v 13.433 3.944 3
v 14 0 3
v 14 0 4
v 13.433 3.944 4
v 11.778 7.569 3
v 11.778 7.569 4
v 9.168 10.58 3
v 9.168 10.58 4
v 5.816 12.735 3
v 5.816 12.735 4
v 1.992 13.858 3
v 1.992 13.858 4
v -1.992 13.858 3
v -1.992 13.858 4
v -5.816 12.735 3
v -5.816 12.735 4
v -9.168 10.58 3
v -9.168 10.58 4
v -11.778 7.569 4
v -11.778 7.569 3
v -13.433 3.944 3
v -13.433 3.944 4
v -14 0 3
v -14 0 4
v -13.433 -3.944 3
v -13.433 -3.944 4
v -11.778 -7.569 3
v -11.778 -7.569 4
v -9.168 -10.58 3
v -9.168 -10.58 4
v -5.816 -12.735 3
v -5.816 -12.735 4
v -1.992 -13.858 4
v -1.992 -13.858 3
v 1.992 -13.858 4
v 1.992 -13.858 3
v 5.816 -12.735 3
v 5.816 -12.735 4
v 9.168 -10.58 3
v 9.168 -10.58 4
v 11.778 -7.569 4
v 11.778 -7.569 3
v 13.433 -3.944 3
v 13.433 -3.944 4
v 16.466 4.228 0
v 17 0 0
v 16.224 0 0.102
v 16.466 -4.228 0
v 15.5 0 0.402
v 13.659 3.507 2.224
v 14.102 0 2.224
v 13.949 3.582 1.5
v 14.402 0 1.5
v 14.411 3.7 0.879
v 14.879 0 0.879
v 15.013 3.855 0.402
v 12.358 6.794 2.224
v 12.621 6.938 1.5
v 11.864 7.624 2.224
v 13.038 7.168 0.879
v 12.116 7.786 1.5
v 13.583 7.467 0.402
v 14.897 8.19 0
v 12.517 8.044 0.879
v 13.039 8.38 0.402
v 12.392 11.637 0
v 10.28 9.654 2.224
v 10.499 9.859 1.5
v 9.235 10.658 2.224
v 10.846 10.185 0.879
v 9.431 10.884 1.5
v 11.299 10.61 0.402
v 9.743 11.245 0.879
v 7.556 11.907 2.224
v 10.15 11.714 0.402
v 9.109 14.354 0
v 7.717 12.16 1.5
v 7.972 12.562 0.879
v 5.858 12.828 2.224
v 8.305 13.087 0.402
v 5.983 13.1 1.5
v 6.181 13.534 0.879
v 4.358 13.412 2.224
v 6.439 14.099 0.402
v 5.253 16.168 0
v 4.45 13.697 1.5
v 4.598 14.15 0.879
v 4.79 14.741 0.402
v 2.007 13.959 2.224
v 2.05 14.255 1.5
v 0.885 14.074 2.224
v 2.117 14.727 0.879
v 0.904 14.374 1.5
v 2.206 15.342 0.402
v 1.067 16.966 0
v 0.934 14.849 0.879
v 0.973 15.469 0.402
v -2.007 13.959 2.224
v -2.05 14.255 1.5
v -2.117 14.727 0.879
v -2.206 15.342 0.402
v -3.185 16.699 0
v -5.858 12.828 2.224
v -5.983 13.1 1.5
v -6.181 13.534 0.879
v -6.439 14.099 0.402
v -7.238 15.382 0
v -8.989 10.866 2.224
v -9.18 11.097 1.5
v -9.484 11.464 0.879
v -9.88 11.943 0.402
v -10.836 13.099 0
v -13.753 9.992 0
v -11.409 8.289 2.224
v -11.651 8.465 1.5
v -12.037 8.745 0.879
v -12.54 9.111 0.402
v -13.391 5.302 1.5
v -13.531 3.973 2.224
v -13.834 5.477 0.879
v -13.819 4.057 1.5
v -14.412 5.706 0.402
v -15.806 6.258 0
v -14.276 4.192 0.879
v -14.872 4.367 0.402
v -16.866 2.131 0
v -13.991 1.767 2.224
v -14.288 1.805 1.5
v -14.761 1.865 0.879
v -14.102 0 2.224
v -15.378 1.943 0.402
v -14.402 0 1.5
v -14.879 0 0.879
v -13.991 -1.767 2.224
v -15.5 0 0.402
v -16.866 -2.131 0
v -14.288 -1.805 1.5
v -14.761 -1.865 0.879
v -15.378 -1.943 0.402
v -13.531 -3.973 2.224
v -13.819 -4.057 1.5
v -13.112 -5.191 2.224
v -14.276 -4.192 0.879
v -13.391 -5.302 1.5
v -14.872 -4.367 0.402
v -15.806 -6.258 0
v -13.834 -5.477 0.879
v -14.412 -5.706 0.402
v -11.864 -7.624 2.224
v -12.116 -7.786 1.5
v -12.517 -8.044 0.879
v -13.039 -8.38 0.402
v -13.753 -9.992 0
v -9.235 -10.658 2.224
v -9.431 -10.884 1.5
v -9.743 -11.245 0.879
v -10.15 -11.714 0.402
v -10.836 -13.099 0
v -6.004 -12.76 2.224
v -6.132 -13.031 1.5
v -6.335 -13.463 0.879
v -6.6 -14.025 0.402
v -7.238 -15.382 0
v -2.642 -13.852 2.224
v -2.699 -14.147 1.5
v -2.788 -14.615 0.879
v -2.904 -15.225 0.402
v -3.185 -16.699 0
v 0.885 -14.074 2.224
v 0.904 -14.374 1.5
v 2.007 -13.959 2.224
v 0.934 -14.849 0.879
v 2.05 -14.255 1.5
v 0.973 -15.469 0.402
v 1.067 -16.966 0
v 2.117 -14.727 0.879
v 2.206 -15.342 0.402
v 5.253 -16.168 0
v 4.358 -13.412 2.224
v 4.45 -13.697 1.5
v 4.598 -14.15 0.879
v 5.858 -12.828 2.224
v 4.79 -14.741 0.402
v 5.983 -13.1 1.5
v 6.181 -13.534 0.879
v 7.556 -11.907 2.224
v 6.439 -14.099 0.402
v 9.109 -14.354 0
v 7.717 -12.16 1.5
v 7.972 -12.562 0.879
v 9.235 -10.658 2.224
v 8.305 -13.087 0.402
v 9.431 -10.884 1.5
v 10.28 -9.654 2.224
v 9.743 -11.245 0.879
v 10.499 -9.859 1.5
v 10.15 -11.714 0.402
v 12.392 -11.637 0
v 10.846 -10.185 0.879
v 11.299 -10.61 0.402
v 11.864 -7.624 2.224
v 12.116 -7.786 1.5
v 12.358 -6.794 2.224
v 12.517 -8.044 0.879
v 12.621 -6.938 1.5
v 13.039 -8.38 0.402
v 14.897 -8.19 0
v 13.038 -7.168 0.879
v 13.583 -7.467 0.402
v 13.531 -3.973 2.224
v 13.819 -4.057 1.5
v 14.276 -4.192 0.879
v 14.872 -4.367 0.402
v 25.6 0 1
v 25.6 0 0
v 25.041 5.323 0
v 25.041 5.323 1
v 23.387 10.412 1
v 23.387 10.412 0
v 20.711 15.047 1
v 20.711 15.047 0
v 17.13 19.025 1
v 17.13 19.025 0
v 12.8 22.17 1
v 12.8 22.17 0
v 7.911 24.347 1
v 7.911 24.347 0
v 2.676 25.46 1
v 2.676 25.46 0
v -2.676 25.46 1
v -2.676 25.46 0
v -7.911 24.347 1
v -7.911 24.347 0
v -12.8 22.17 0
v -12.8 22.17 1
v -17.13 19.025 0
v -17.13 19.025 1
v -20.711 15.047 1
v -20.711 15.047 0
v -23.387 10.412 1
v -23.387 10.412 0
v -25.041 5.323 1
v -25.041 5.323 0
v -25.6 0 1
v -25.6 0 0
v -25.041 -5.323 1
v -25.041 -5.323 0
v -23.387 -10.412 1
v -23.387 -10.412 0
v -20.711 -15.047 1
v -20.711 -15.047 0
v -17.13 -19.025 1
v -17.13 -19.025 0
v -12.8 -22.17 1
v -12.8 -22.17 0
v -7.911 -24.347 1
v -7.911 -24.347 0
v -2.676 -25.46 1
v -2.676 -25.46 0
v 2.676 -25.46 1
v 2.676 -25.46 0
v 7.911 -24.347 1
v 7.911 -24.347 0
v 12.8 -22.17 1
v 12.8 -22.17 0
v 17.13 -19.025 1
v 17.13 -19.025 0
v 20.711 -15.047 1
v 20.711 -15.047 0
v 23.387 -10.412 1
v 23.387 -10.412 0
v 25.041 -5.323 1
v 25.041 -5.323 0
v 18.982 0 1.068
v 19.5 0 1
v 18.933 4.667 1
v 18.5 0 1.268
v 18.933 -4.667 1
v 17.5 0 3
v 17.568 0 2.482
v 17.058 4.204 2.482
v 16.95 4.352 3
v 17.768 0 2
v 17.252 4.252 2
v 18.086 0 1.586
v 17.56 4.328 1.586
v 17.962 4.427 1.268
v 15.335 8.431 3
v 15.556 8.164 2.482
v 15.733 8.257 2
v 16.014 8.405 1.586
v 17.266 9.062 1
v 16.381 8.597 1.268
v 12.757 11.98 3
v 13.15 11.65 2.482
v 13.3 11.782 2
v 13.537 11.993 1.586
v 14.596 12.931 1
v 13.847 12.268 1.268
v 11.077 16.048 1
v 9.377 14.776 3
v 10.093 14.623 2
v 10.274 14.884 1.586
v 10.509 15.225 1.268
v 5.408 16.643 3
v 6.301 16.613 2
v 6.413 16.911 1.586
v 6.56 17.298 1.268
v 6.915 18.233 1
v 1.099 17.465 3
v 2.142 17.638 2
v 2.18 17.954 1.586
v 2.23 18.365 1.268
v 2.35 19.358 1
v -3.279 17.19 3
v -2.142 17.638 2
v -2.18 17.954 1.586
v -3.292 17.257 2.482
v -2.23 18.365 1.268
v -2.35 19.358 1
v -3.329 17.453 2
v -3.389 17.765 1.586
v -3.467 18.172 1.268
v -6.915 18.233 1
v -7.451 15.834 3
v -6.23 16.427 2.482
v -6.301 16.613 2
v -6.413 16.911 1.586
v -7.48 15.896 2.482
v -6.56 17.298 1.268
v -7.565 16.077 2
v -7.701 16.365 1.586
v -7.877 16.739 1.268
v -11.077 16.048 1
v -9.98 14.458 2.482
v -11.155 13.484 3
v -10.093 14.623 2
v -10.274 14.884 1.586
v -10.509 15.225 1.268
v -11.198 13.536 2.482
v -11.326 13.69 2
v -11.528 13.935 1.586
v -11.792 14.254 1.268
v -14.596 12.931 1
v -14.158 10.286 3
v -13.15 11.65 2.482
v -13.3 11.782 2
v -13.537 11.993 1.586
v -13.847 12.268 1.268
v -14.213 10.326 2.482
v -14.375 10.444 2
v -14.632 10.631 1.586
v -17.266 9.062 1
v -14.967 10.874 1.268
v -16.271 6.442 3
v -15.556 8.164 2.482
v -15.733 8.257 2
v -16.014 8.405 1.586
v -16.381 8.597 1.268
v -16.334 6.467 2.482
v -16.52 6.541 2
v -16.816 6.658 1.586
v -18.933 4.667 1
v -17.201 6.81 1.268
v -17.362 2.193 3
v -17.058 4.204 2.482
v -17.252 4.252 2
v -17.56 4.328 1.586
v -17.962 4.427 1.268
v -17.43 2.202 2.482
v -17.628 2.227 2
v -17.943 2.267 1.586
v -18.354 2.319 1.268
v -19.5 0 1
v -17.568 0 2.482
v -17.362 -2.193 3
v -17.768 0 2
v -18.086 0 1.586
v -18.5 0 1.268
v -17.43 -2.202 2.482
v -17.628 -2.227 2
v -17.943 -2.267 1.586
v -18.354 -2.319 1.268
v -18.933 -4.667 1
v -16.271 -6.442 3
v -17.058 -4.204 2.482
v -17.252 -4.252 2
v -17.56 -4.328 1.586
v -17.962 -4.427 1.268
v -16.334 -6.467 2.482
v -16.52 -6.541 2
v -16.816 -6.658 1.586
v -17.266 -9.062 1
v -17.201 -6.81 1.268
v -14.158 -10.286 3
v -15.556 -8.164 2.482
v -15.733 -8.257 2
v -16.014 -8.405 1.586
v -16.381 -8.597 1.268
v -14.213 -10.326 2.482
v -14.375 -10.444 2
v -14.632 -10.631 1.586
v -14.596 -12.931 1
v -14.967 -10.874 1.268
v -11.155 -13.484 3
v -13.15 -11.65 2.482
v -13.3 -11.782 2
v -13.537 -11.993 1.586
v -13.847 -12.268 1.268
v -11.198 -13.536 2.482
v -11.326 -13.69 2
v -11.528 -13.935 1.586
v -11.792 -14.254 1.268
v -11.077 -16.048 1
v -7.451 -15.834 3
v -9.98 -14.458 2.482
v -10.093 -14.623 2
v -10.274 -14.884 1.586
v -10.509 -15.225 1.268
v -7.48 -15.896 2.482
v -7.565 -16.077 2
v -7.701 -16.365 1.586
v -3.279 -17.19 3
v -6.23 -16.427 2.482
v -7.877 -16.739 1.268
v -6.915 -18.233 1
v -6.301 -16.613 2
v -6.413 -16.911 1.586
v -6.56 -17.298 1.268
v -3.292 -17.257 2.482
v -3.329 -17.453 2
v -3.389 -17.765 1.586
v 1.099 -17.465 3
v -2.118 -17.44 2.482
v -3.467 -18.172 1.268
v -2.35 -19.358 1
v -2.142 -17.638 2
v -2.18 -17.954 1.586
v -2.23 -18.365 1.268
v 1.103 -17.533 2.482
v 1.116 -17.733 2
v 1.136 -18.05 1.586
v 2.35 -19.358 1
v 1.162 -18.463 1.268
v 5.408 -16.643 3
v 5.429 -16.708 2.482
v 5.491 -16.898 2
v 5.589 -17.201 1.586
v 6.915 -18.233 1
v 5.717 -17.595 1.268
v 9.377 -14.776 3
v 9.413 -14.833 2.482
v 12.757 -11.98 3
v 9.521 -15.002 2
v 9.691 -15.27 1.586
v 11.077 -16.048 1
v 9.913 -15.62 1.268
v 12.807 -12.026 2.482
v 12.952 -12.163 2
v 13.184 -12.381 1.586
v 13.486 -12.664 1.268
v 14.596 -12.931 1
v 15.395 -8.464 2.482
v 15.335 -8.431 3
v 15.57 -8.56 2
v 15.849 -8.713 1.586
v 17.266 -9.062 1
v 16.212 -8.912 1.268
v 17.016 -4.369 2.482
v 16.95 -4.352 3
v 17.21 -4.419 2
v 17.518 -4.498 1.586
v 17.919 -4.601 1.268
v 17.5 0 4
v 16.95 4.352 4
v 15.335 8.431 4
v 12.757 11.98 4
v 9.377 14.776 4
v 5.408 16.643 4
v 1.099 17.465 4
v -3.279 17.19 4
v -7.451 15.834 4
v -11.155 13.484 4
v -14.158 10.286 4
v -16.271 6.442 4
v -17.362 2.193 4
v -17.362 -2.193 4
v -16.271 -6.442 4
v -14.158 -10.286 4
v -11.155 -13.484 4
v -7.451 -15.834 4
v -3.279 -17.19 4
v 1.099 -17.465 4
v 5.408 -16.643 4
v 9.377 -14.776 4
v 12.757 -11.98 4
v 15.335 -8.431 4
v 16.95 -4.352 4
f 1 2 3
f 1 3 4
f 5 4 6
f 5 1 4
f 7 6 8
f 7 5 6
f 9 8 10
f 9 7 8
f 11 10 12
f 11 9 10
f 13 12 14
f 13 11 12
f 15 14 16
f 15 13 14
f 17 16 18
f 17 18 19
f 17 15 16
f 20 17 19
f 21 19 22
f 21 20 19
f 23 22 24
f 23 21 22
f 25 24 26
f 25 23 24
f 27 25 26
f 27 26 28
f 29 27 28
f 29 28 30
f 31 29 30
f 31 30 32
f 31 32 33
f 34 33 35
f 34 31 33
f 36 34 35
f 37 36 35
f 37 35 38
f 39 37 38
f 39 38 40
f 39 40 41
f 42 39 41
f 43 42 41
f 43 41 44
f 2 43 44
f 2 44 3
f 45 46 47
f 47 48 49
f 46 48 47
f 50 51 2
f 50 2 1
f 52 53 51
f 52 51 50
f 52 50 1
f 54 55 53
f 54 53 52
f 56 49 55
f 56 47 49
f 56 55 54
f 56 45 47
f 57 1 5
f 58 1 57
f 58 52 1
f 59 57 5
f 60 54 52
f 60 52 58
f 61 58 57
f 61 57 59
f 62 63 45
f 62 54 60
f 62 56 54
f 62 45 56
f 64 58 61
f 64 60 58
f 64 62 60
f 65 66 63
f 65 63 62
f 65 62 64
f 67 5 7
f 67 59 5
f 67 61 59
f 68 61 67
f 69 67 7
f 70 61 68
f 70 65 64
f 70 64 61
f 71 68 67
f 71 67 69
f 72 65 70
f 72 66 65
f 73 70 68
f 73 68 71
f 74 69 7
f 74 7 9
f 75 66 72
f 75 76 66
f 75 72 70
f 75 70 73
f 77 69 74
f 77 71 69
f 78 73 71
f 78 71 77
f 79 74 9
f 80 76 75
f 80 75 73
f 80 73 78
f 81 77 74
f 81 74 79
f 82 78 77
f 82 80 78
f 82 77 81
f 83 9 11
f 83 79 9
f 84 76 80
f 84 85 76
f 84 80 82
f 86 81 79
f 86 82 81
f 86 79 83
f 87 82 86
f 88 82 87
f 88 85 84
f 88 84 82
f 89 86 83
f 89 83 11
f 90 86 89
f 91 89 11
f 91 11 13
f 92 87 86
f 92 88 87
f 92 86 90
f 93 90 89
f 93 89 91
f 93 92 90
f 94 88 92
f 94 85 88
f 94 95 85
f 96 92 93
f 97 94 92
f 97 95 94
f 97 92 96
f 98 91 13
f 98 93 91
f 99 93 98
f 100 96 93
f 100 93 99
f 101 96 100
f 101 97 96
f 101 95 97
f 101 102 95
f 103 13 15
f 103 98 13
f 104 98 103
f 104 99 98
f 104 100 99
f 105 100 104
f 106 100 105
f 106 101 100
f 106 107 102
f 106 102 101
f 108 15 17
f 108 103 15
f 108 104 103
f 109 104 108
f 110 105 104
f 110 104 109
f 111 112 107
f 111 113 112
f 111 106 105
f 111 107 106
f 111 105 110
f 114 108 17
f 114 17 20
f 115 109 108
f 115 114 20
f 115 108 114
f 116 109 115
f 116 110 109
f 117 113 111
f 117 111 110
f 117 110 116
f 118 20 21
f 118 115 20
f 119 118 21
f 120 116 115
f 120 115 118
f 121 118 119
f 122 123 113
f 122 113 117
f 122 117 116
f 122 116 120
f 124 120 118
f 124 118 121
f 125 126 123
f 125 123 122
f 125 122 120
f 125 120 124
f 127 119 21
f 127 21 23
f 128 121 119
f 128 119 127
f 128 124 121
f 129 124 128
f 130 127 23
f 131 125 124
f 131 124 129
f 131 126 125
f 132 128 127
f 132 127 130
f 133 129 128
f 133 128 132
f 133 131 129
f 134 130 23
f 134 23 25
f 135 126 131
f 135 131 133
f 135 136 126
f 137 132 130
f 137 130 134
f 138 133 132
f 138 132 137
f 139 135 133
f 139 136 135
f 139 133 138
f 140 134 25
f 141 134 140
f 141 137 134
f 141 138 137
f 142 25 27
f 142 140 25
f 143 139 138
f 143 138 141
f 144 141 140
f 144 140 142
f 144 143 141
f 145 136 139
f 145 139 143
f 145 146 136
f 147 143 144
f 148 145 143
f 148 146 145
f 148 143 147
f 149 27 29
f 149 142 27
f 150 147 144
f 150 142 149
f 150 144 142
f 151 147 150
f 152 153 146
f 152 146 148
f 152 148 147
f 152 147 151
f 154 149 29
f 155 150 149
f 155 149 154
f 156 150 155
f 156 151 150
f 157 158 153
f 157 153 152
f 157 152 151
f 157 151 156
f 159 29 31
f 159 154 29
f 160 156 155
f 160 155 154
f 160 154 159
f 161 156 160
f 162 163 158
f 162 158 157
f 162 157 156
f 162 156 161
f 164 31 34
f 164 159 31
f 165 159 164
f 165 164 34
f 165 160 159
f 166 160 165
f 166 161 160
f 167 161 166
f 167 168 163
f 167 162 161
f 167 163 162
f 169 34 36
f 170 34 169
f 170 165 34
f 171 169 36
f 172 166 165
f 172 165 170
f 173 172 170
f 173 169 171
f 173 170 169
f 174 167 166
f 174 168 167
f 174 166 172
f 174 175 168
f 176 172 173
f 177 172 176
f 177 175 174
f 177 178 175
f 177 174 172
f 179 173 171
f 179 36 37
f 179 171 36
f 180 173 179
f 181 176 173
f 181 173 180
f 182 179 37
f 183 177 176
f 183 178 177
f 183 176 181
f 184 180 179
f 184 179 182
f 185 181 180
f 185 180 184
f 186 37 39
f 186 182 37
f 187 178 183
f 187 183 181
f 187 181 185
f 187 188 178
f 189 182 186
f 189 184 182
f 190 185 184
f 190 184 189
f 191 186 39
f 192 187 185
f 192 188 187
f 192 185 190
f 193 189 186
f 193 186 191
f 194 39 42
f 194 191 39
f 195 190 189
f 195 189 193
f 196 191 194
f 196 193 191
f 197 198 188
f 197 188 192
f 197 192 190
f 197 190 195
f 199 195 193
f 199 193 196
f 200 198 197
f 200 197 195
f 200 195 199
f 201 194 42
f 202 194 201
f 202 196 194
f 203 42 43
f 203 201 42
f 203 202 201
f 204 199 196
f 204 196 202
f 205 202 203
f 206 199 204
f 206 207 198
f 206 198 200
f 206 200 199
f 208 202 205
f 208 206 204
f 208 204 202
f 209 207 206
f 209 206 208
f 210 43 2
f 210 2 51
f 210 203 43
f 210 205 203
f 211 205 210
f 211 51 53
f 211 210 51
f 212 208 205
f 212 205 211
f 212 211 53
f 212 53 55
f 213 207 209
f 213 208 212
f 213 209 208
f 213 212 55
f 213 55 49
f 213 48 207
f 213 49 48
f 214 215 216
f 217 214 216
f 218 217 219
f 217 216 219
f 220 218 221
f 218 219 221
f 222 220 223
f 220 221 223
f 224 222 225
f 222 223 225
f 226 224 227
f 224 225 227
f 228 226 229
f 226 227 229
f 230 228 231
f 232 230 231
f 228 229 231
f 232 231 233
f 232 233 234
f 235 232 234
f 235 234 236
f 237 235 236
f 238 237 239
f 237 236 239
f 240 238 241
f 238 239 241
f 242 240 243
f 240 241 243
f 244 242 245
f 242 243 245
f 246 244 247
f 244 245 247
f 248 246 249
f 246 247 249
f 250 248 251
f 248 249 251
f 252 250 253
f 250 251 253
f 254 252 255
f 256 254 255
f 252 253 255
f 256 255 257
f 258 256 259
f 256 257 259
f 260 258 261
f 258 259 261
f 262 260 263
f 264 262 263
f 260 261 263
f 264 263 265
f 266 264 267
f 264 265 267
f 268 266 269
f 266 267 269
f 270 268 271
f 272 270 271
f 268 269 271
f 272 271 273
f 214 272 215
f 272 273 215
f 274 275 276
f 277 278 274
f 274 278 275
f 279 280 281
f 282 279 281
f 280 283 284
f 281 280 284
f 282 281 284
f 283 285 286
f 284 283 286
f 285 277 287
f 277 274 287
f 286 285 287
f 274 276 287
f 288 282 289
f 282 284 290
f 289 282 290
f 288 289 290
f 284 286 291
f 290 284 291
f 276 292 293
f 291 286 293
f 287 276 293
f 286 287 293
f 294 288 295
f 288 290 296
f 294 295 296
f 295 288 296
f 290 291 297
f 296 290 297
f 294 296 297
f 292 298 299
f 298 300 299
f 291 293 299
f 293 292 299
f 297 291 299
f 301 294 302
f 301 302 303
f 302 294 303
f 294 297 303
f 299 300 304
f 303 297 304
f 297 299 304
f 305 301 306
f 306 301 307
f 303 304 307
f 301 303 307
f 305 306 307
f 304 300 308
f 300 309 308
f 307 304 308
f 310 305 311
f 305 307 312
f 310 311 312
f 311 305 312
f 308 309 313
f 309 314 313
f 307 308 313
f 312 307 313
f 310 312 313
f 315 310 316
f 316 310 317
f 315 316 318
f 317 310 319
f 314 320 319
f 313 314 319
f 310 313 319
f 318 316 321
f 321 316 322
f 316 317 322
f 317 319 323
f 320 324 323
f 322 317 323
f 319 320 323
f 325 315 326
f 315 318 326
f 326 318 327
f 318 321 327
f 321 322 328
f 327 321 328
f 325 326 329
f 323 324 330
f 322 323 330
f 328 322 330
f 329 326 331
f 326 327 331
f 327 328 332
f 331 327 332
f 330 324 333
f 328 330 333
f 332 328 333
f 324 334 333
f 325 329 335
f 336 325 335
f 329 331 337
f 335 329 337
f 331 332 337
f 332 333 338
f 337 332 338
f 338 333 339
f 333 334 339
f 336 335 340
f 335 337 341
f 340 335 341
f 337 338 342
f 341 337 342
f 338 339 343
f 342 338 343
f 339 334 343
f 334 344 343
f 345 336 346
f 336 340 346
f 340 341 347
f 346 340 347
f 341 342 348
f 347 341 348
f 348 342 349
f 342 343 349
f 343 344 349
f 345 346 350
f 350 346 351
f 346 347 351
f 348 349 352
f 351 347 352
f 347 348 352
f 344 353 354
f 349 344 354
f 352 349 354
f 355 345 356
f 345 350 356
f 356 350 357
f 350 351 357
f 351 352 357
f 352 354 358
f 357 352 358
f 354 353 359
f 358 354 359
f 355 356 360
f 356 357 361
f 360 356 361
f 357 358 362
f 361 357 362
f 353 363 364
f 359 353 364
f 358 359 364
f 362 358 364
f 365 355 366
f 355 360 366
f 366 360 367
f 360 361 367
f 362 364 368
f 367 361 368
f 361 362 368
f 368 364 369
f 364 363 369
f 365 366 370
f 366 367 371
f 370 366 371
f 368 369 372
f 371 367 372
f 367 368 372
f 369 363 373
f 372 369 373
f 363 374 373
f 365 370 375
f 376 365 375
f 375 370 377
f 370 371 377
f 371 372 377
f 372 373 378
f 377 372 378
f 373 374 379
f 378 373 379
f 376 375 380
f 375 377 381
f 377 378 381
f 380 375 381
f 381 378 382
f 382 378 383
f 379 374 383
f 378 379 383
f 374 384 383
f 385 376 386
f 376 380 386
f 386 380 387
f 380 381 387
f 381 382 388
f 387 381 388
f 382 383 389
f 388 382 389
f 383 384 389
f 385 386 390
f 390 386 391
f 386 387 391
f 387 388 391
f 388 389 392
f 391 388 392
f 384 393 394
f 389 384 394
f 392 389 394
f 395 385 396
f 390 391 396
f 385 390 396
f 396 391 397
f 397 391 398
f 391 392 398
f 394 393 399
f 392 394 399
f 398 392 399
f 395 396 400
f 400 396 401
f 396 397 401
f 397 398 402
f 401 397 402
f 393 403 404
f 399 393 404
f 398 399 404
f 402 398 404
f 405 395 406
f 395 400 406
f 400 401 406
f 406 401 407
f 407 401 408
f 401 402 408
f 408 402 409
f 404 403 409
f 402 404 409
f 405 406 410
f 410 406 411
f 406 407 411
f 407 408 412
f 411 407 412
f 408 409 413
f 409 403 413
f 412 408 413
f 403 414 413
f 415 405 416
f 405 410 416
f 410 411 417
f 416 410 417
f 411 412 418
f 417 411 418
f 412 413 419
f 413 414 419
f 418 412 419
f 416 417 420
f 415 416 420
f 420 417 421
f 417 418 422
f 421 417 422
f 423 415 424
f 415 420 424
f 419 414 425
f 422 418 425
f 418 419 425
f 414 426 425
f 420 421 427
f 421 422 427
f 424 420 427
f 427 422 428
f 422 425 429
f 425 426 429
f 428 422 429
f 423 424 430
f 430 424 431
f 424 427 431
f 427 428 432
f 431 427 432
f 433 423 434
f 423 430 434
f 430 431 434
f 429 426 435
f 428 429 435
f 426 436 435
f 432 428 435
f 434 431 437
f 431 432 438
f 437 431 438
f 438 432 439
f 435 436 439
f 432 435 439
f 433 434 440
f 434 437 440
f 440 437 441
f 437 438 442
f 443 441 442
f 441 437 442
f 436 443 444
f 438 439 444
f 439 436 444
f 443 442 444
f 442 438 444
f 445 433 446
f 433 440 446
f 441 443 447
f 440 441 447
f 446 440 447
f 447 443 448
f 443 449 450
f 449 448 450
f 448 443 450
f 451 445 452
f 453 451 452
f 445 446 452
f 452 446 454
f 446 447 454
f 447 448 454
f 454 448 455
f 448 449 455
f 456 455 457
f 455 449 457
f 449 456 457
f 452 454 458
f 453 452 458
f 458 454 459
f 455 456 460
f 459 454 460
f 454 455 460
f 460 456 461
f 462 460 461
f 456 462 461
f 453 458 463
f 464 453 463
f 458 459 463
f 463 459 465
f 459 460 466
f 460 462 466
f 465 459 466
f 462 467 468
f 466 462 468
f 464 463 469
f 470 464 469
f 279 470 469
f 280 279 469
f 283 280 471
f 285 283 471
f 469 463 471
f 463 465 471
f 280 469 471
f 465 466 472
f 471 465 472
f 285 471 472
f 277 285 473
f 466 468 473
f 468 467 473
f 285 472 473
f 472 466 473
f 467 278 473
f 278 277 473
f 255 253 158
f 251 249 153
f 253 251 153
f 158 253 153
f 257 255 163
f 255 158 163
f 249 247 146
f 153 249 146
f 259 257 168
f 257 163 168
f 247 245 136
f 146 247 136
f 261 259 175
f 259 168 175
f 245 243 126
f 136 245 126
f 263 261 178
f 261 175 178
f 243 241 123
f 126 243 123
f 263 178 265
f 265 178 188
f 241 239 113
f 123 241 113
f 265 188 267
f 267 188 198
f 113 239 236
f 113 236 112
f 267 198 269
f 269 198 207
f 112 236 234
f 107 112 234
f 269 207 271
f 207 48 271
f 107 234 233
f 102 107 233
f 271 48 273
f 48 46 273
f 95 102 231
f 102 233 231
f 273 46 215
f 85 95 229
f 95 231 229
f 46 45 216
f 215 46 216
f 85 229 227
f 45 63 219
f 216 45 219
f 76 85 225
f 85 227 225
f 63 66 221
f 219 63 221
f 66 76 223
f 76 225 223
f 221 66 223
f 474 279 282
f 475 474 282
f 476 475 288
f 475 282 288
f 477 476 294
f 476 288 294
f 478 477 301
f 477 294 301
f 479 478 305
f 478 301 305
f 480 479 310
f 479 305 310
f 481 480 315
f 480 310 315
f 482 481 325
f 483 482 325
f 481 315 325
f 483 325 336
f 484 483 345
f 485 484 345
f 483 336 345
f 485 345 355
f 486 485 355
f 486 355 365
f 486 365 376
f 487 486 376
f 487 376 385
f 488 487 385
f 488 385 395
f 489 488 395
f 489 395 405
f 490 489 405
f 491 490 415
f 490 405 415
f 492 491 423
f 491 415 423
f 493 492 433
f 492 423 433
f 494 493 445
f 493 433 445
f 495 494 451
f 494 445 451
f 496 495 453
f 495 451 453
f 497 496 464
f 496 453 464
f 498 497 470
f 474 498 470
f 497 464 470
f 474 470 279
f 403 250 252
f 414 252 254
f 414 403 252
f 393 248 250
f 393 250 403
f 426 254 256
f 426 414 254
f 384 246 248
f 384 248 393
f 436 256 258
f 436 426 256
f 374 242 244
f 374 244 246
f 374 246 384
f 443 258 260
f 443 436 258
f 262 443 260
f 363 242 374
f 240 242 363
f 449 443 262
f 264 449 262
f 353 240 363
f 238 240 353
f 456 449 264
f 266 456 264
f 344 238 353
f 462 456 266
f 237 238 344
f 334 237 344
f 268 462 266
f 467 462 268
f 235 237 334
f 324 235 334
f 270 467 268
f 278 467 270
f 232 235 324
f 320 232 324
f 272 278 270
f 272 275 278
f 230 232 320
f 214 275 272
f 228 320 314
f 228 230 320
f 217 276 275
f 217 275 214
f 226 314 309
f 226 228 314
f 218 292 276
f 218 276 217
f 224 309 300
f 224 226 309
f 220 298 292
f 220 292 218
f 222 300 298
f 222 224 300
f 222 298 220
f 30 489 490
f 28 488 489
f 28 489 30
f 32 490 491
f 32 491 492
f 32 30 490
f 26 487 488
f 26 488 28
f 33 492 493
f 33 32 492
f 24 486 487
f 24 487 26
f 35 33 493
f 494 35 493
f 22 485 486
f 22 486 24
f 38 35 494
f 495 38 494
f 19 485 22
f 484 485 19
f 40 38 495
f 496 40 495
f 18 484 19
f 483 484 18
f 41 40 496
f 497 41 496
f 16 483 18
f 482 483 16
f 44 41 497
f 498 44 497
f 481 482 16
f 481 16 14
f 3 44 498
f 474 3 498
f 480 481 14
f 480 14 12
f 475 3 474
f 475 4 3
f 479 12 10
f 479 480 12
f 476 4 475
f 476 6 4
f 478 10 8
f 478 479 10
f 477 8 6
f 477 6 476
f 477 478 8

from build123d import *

# Parameters (mm, degrees)
SKETCH_1_R      = 25.6
SKETCH_1_R_2    = 14
EXTRUDE_1_DEPTH = 1
SKETCH_2_R      = 17.5
SKETCH_2_R_2    = 14
EXTRUDE_2_DEPTH = 3
FILLET_2_R      = 2
FILLET_3_R      = 3


with BuildPart() as part:
    # 草图1 → 凸台-拉伸1 (new body)
    with BuildSketch(Plane.XY):
        Circle(SKETCH_1_R)
        Circle(SKETCH_1_R_2, mode=Mode.SUBTRACT)
    extrude(amount=EXTRUDE_1_DEPTH)

    # 草图2 → 凸台-拉伸2 (add)
    with BuildSketch(Plane.XY.offset(1)):
        Circle(SKETCH_2_R)
        Circle(SKETCH_2_R_2, mode=Mode.SUBTRACT)
    extrude(amount=EXTRUDE_2_DEPTH)

    # 圆角2
    fillet_2_edges = [part.edges().sort_by_distance(p)[0] for p in [
        (-17.5, 0, 1),
    ]]
    fillet(fillet_2_edges, radius=FILLET_2_R)

    # 圆角3
    fillet_3_edges = [part.edges().sort_by_distance(p)[0] for p in [
        (-14, 0, 0),
    ]]
    fillet(fillet_3_edges, radius=FILLET_3_R)


solid = part.part
